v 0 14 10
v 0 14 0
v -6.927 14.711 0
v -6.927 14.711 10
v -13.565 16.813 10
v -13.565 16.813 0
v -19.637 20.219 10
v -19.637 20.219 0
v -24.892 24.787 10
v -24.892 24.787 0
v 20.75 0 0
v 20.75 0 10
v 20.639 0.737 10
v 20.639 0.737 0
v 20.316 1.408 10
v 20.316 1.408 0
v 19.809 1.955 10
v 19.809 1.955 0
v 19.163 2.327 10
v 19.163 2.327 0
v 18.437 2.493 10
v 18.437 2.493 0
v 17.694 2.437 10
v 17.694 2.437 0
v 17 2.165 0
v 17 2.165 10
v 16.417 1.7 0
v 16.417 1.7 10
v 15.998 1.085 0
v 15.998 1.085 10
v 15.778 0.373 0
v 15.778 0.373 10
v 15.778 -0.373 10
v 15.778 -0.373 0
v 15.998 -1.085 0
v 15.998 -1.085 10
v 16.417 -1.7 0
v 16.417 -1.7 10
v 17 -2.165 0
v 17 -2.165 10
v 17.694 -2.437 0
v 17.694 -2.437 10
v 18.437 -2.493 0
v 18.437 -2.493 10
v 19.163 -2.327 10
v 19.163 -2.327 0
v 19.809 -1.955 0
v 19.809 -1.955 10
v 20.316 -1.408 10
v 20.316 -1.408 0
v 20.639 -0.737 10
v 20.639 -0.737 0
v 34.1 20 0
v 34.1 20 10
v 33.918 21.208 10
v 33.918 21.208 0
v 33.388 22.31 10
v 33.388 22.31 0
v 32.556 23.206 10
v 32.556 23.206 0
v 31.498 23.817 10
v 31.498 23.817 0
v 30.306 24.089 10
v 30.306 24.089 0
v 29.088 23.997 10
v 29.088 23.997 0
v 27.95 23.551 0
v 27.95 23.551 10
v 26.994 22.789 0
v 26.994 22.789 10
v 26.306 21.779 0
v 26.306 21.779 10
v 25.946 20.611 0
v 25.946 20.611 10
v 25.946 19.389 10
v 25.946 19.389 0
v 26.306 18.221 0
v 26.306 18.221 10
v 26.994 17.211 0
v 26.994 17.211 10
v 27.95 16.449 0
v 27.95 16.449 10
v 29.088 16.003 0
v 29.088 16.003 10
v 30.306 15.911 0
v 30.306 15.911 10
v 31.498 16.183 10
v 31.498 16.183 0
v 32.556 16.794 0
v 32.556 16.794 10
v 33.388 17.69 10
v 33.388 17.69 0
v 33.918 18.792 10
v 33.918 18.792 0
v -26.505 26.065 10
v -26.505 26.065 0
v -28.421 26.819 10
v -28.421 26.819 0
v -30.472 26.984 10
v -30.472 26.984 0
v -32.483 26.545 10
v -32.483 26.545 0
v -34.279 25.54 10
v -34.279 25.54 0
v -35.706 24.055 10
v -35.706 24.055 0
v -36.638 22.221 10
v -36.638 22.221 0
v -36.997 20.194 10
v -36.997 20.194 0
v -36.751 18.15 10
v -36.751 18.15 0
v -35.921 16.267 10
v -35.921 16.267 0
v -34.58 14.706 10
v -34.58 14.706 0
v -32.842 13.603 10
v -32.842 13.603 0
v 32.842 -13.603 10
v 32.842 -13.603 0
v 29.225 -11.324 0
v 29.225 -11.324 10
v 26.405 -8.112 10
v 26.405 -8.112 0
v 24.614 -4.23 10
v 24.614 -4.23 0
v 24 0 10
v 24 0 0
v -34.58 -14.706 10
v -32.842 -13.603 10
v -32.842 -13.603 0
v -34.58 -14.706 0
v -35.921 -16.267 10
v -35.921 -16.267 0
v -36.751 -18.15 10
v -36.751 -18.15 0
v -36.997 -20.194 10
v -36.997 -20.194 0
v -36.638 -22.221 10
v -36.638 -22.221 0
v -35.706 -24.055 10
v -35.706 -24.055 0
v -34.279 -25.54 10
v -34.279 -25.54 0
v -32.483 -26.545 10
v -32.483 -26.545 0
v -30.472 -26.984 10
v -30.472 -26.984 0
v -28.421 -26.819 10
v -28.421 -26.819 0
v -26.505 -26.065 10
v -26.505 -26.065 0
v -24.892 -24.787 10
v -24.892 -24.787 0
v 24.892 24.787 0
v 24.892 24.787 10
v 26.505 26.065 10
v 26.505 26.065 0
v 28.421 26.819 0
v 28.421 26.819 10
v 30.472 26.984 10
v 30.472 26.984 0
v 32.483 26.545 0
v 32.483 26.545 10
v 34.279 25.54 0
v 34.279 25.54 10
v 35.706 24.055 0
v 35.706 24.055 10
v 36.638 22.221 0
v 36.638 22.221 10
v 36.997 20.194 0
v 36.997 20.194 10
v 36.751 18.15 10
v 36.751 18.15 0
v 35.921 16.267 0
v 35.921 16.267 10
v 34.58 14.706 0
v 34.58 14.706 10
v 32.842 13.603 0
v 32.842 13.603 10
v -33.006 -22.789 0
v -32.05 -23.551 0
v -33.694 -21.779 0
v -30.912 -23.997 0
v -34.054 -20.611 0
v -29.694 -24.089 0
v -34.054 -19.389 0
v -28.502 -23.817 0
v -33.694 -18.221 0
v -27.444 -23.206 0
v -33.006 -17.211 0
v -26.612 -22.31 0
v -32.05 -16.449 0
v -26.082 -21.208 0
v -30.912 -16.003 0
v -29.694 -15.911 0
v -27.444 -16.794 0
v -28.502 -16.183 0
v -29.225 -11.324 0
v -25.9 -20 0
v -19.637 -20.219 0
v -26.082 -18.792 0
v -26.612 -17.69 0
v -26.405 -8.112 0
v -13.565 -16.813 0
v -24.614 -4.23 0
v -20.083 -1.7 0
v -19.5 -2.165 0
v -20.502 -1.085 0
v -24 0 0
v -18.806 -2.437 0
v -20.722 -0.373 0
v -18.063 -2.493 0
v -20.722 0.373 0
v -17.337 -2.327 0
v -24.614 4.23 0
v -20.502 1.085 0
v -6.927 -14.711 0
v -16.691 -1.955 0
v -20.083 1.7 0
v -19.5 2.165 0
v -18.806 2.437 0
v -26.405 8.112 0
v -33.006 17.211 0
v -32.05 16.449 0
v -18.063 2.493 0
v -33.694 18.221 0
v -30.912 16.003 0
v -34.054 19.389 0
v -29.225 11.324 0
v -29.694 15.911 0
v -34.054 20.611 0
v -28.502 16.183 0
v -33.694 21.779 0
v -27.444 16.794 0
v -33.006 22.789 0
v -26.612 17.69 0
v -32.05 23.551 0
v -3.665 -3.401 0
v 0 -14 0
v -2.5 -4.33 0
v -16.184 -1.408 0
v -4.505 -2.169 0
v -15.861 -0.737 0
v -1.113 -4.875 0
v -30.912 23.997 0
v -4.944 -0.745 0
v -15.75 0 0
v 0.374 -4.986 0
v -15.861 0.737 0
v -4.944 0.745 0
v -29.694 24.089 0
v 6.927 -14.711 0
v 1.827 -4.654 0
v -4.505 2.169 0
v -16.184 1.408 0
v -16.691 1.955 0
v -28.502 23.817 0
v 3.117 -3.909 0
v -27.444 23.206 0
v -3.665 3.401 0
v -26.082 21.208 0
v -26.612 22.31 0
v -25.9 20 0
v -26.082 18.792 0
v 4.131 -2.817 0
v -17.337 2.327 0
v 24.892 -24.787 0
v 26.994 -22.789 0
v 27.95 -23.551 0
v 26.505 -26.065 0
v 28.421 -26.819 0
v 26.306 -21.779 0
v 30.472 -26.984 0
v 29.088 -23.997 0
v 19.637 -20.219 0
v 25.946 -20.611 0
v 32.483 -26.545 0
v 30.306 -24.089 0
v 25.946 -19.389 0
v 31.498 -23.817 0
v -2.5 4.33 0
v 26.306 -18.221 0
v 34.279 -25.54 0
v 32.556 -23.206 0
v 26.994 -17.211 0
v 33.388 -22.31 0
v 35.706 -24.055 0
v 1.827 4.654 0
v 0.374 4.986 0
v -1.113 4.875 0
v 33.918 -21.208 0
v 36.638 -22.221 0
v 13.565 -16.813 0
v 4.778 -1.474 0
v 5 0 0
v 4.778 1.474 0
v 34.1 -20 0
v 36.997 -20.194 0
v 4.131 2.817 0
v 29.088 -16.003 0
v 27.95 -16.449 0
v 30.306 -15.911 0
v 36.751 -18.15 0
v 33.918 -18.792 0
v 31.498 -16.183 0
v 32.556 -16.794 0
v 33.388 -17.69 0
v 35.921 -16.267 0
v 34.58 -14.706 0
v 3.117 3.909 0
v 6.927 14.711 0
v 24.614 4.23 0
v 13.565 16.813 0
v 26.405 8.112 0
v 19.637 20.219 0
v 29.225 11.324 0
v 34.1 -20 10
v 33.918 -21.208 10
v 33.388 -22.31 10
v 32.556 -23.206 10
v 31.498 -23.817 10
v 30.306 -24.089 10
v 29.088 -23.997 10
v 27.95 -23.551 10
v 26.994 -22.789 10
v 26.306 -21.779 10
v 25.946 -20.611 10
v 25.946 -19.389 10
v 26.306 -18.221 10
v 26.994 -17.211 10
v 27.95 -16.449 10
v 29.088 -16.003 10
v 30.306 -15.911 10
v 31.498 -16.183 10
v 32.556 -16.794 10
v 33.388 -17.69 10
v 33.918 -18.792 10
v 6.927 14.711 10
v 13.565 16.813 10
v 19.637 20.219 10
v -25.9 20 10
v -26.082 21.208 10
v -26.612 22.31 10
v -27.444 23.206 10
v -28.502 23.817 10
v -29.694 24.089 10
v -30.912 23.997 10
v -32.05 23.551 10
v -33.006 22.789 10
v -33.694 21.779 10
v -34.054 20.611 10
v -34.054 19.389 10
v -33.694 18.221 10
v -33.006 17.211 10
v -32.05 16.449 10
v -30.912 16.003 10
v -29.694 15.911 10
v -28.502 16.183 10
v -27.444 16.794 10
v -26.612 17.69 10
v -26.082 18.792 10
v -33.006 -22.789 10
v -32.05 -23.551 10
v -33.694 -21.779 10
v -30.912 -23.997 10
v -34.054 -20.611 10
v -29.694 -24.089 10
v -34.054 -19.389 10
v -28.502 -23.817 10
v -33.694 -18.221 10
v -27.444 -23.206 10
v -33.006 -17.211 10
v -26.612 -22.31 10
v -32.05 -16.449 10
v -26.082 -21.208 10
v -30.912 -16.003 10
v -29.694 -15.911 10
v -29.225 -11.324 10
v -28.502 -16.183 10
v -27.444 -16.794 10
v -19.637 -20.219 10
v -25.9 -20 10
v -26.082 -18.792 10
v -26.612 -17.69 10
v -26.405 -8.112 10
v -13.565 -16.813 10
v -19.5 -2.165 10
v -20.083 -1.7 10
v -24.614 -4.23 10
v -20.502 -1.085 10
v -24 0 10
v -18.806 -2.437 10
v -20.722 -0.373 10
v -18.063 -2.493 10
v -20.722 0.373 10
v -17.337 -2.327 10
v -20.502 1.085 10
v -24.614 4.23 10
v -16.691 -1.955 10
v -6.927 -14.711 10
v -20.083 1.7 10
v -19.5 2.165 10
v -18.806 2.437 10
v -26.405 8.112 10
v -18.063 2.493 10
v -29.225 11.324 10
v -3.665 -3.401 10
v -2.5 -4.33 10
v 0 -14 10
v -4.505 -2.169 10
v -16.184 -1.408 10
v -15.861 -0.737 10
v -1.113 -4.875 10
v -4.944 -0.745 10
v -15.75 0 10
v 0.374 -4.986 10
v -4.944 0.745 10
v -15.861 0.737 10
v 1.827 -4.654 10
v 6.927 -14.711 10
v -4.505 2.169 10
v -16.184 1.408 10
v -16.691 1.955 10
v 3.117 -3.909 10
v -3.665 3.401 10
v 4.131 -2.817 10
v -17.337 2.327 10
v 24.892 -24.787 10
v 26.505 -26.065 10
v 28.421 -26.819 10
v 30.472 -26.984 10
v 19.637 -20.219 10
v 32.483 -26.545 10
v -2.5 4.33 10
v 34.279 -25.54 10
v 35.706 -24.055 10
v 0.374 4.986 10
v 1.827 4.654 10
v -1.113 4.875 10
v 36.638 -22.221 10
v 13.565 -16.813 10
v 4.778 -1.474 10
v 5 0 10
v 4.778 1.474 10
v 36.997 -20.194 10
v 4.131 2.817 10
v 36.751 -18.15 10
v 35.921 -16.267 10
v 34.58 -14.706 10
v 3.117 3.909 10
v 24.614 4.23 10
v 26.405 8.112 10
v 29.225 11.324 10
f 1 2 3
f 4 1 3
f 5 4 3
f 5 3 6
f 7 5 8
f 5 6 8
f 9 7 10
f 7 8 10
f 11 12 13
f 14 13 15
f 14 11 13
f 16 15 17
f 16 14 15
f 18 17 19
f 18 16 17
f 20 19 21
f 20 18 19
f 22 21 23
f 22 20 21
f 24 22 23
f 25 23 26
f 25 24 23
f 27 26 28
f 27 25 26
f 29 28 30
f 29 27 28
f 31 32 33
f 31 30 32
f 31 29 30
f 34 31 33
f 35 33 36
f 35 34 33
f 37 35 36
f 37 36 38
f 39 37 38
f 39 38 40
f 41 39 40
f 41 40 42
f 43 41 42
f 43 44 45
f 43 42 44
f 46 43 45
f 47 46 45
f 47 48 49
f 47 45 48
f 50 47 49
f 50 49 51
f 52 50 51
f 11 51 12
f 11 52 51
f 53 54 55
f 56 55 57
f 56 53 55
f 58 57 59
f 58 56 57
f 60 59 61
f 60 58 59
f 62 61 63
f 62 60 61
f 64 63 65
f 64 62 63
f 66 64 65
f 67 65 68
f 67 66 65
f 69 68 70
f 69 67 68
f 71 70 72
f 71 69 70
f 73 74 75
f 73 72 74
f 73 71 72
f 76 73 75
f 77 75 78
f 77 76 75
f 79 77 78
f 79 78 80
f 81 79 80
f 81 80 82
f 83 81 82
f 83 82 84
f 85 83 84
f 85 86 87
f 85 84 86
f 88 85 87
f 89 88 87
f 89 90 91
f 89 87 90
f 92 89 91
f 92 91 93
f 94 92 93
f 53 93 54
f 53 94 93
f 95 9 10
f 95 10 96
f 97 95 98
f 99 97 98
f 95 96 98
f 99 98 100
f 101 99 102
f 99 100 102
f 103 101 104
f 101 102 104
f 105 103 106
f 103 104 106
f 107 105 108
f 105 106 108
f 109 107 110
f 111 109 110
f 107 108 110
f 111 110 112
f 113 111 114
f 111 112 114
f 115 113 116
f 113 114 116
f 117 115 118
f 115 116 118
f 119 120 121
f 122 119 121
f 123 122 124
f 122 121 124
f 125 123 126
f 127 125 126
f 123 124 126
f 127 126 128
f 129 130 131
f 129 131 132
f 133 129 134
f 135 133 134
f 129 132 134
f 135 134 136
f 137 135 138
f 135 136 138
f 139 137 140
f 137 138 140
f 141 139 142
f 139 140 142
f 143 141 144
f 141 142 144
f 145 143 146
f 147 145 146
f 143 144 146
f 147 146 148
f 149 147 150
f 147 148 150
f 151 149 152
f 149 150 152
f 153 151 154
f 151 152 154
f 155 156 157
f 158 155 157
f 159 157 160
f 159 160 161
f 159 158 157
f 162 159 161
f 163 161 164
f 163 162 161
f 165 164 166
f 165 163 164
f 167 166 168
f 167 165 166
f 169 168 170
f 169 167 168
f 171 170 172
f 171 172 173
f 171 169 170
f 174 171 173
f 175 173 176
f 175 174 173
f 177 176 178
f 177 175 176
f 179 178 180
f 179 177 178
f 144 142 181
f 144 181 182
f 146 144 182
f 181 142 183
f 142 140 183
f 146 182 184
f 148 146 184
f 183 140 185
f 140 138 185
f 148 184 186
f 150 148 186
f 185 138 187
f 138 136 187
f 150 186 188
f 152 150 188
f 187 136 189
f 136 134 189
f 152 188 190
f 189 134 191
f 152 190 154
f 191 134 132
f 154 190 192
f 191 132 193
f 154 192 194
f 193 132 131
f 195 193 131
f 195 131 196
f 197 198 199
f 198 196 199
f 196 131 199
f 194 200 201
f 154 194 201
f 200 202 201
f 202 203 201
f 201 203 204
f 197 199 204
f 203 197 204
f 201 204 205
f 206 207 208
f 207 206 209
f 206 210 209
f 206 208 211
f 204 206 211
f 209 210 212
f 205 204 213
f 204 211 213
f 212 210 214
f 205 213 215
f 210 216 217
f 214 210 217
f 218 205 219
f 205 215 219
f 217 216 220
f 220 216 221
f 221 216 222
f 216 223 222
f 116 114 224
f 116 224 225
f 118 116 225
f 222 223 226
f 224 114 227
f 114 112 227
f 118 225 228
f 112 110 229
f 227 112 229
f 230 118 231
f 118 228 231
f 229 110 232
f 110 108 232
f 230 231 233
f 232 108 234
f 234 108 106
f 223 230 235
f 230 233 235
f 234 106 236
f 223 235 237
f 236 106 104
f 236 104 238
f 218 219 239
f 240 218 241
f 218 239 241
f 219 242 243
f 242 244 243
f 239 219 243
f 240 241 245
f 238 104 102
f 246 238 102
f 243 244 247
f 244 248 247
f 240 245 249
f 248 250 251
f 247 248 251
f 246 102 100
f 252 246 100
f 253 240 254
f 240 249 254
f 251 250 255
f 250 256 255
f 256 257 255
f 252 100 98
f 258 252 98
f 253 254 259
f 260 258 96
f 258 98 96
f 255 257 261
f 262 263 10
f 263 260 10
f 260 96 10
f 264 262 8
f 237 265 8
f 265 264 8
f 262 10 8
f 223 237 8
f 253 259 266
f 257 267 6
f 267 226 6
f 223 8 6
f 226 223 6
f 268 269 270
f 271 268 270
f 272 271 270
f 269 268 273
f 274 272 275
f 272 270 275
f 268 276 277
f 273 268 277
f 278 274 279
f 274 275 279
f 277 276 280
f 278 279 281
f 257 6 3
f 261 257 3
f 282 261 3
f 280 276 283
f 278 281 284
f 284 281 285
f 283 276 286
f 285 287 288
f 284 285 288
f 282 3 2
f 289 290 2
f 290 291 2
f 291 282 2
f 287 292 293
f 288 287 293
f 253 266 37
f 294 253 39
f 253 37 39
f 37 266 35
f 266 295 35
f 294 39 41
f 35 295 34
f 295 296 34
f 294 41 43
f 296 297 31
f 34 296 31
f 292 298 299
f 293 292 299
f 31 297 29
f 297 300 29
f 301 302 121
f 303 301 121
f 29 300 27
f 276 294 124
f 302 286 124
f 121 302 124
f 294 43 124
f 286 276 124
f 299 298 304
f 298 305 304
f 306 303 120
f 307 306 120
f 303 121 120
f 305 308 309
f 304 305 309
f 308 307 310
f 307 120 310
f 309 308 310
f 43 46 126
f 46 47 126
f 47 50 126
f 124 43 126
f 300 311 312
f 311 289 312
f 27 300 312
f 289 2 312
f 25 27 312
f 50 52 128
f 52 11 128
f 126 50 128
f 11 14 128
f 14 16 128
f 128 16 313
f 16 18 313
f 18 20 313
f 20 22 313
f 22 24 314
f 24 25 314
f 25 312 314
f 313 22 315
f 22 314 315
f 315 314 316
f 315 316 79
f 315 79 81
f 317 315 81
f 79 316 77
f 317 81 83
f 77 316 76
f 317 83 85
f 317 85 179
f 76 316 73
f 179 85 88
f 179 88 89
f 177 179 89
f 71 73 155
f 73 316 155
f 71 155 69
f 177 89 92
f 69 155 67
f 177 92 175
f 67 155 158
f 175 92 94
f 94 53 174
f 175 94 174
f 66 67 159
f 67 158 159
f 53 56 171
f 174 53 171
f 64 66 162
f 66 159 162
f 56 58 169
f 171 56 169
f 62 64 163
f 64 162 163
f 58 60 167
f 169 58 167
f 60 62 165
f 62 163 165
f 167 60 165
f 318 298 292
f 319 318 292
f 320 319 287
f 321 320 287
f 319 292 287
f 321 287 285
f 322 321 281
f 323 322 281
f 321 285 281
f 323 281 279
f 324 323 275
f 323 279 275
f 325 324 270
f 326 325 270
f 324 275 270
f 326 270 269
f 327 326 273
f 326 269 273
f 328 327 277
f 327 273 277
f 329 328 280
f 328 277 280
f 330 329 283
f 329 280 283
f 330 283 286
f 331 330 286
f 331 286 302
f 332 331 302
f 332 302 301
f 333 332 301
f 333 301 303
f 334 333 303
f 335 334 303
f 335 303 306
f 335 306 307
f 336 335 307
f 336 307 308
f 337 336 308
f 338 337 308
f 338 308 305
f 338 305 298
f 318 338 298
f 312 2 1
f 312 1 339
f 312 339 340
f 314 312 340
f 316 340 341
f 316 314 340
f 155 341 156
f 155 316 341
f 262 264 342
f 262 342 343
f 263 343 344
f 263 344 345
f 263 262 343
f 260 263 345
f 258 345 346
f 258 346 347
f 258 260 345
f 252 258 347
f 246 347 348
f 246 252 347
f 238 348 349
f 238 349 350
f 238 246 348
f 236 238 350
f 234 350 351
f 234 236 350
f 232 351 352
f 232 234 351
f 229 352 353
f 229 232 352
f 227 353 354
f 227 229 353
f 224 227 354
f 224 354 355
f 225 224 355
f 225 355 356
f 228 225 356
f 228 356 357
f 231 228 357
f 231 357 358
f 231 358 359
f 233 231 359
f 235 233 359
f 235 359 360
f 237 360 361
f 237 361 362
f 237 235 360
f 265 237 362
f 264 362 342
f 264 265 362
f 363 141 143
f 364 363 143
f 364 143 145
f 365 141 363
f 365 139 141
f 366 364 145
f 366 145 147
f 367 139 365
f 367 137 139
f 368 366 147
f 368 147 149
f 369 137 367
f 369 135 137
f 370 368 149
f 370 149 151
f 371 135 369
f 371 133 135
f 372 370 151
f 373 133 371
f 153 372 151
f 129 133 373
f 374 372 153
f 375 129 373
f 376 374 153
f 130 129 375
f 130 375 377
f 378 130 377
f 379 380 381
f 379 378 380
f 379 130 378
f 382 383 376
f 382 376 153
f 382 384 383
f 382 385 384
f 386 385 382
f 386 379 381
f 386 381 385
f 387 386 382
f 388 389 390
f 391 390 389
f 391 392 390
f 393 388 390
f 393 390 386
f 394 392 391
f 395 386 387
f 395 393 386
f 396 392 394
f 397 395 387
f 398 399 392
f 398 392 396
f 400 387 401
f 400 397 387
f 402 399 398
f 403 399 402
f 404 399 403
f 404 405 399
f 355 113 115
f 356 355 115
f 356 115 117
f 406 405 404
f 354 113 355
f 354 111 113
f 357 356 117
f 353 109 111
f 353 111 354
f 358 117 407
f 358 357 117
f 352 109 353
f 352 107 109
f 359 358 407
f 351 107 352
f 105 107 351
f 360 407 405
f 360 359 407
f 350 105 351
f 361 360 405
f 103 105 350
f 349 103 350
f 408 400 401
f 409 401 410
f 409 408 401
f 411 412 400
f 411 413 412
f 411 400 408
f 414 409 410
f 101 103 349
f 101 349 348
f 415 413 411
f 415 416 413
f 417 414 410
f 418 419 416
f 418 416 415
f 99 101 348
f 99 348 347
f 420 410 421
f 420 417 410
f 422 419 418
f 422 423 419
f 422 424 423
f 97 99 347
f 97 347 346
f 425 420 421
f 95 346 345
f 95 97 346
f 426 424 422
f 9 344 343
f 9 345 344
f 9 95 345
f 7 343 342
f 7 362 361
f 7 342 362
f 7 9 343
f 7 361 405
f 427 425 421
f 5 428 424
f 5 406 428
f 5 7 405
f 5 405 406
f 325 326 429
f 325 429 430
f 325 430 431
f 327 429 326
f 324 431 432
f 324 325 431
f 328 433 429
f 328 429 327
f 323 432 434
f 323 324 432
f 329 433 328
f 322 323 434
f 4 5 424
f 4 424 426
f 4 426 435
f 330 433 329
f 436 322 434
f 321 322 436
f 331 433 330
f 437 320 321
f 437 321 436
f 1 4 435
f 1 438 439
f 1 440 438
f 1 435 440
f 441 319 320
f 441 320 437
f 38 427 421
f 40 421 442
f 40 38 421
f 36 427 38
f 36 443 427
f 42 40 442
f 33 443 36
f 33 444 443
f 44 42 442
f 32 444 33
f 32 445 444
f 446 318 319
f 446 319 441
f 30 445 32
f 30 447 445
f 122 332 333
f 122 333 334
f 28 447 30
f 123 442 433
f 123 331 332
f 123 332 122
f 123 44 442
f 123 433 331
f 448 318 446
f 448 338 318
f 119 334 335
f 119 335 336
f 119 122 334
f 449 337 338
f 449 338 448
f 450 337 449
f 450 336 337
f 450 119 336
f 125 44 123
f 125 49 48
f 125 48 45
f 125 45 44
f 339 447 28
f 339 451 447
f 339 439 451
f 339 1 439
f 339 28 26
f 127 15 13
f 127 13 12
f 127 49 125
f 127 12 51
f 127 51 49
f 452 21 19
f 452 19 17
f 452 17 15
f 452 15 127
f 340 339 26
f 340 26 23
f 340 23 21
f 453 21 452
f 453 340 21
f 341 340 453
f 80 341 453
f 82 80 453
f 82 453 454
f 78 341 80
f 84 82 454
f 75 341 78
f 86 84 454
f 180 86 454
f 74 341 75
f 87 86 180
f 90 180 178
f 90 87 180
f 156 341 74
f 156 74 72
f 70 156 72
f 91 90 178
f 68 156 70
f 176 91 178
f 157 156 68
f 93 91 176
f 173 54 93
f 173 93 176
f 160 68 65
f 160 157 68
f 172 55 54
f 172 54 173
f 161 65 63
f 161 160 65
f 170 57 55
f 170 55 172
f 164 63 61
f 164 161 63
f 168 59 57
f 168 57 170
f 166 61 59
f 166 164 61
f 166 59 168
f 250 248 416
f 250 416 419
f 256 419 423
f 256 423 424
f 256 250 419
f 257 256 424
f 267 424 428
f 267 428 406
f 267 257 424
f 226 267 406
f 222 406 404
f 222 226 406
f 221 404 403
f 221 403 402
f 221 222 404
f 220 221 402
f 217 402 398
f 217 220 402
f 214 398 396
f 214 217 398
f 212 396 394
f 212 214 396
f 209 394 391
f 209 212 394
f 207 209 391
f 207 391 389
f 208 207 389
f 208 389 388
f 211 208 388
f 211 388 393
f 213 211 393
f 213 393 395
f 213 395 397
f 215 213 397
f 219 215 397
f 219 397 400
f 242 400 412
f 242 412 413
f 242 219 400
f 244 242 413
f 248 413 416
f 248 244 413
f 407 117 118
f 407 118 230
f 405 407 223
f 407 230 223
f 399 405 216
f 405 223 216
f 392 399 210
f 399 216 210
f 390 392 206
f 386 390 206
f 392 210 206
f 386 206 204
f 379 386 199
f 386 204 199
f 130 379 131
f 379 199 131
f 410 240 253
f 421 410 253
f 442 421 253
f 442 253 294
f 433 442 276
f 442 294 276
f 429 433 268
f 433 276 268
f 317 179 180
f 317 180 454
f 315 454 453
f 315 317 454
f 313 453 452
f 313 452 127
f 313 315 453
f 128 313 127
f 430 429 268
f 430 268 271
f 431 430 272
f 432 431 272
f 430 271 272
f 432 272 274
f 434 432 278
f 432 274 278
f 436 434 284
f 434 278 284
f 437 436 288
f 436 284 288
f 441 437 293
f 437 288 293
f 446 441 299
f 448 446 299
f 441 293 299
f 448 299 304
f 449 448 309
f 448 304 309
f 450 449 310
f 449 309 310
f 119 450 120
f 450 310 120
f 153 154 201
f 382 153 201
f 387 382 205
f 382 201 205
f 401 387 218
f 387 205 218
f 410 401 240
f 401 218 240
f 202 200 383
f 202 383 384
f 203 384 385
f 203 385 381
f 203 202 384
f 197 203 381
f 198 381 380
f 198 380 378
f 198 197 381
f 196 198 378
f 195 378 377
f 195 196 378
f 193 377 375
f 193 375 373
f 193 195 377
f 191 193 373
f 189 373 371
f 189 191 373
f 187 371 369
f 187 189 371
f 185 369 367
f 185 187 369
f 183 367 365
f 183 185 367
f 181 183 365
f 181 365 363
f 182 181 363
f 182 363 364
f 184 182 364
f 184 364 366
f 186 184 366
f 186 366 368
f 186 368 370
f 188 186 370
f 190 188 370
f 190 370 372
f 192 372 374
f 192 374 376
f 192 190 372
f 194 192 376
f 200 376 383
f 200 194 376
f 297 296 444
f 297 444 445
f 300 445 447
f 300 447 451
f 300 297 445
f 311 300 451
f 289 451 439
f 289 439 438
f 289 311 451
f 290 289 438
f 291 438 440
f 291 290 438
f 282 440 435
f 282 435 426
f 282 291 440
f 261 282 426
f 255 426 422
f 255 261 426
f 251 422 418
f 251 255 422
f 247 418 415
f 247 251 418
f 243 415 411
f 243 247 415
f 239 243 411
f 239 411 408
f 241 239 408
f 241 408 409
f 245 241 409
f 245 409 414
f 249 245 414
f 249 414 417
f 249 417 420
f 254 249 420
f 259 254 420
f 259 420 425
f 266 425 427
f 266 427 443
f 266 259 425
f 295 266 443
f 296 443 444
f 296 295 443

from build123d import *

# Parameters (mm, degrees)
SALIENTE_EXTRUIR1_DEPTH = 10
CROQUIS3_R              = 4.1
CORTAR_EXTRUIR1_DEPTH   = 47.882832679
CROQUIS9_R              = 2.5
CORTAR_EXTRUIR6_DEPTH   = 47.882832679
SIMETR_A2_OUTLINE_R     = 4.1
SIMETR_A2_OUTLINE_R_2   = 2.5
SIMETR_A2_DEPTH         = 10
CROQUIS8_R              = 5
CORTAR_EXTRUIR2_DEPTH   = 10


# Read off the part's stored shape, not the designer's step: Simetría2
with BuildPart() as part:
    # Croquis2 → Saliente-Extruir1 (new body)
    with BuildSketch(Plane.XY):
        with BuildLine():
            Line((24, 0), (0, 0))
            Line((0, 0), (0, 14))
            ThreePointArc((0, 14), (13.564530661, 16.812621552), (24.892422825, 24.786716558))
            ThreePointArc((24.892422825, 24.786716558), (35.705553054, 24.055448723), (32.841827768, 13.602811951))
            ThreePointArc((32.841827768, 13.602811951), (26.404704634, 8.111941988), (24, 0))
        make_face()
    saliente_extruir1 = extrude(amount=SALIENTE_EXTRUIR1_DEPTH)

    # Croquis3 → Cortar-Extruir1 (cut, through all)
    with BuildSketch(Plane.XY):
        with Locations((30, 20)):
            Circle(CROQUIS3_R)
    cortar_extruir1 = extrude(amount=CORTAR_EXTRUIR1_DEPTH, mode=Mode.SUBTRACT)

    # Simetría1: Saliente-Extruir1, Cortar-Extruir1 across plane
    add(saliente_extruir1.mirror(Plane.ZX))
    add(cortar_extruir1.mirror(Plane.ZX), mode=Mode.SUBTRACT)

    # Croquis9 → Cortar-Extruir6 (cut, through all)
    with BuildSketch(Plane.XY):
        with Locations((18.25, 0)):
            Circle(CROQUIS9_R)
    extrude(amount=CORTAR_EXTRUIR6_DEPTH, mode=Mode.SUBTRACT)

    # Simetría2 outline → Simetría2 (add)
    with BuildSketch(Plane.XY):
        with BuildLine():
            Line((0, -14), (0, 14))
            ThreePointArc((0, 14), (-13.564530661, 16.812621552), (-24.892422825, 24.786716558))
            ThreePointArc((-24.892422825, 24.786716558), (-35.705553054, 24.055448723), (-32.841827768, 13.602811951))
            ThreePointArc((-32.841827768, 13.602811951), (-24, 0), (-32.841827768, -13.602811951))
            ThreePointArc((-32.841827768, -13.602811951), (-35.705553054, -24.055448723), (-24.892422825, -24.786716558))
            ThreePointArc((-24.892422825, -24.786716558), (-13.564530661, -16.812621552), (0, -14))
        make_face()
        with Locations((-30, -20)):
            Circle(SIMETR_A2_OUTLINE_R, mode=Mode.SUBTRACT)
        with Locations((-30, 20)):
            Circle(SIMETR_A2_OUTLINE_R, mode=Mode.SUBTRACT)
        with Locations((-18.25, 0)):
            Circle(SIMETR_A2_OUTLINE_R_2, mode=Mode.SUBTRACT)
    extrude(amount=SIMETR_A2_DEPTH)

    # Croquis8 → Cortar-Extruir2 (cut)
    with BuildSketch(Plane.XY):
        Circle(CROQUIS8_R)
    extrude(amount=CORTAR_EXTRUIR2_DEPTH, mode=Mode.SUBTRACT)


solid = part.part
